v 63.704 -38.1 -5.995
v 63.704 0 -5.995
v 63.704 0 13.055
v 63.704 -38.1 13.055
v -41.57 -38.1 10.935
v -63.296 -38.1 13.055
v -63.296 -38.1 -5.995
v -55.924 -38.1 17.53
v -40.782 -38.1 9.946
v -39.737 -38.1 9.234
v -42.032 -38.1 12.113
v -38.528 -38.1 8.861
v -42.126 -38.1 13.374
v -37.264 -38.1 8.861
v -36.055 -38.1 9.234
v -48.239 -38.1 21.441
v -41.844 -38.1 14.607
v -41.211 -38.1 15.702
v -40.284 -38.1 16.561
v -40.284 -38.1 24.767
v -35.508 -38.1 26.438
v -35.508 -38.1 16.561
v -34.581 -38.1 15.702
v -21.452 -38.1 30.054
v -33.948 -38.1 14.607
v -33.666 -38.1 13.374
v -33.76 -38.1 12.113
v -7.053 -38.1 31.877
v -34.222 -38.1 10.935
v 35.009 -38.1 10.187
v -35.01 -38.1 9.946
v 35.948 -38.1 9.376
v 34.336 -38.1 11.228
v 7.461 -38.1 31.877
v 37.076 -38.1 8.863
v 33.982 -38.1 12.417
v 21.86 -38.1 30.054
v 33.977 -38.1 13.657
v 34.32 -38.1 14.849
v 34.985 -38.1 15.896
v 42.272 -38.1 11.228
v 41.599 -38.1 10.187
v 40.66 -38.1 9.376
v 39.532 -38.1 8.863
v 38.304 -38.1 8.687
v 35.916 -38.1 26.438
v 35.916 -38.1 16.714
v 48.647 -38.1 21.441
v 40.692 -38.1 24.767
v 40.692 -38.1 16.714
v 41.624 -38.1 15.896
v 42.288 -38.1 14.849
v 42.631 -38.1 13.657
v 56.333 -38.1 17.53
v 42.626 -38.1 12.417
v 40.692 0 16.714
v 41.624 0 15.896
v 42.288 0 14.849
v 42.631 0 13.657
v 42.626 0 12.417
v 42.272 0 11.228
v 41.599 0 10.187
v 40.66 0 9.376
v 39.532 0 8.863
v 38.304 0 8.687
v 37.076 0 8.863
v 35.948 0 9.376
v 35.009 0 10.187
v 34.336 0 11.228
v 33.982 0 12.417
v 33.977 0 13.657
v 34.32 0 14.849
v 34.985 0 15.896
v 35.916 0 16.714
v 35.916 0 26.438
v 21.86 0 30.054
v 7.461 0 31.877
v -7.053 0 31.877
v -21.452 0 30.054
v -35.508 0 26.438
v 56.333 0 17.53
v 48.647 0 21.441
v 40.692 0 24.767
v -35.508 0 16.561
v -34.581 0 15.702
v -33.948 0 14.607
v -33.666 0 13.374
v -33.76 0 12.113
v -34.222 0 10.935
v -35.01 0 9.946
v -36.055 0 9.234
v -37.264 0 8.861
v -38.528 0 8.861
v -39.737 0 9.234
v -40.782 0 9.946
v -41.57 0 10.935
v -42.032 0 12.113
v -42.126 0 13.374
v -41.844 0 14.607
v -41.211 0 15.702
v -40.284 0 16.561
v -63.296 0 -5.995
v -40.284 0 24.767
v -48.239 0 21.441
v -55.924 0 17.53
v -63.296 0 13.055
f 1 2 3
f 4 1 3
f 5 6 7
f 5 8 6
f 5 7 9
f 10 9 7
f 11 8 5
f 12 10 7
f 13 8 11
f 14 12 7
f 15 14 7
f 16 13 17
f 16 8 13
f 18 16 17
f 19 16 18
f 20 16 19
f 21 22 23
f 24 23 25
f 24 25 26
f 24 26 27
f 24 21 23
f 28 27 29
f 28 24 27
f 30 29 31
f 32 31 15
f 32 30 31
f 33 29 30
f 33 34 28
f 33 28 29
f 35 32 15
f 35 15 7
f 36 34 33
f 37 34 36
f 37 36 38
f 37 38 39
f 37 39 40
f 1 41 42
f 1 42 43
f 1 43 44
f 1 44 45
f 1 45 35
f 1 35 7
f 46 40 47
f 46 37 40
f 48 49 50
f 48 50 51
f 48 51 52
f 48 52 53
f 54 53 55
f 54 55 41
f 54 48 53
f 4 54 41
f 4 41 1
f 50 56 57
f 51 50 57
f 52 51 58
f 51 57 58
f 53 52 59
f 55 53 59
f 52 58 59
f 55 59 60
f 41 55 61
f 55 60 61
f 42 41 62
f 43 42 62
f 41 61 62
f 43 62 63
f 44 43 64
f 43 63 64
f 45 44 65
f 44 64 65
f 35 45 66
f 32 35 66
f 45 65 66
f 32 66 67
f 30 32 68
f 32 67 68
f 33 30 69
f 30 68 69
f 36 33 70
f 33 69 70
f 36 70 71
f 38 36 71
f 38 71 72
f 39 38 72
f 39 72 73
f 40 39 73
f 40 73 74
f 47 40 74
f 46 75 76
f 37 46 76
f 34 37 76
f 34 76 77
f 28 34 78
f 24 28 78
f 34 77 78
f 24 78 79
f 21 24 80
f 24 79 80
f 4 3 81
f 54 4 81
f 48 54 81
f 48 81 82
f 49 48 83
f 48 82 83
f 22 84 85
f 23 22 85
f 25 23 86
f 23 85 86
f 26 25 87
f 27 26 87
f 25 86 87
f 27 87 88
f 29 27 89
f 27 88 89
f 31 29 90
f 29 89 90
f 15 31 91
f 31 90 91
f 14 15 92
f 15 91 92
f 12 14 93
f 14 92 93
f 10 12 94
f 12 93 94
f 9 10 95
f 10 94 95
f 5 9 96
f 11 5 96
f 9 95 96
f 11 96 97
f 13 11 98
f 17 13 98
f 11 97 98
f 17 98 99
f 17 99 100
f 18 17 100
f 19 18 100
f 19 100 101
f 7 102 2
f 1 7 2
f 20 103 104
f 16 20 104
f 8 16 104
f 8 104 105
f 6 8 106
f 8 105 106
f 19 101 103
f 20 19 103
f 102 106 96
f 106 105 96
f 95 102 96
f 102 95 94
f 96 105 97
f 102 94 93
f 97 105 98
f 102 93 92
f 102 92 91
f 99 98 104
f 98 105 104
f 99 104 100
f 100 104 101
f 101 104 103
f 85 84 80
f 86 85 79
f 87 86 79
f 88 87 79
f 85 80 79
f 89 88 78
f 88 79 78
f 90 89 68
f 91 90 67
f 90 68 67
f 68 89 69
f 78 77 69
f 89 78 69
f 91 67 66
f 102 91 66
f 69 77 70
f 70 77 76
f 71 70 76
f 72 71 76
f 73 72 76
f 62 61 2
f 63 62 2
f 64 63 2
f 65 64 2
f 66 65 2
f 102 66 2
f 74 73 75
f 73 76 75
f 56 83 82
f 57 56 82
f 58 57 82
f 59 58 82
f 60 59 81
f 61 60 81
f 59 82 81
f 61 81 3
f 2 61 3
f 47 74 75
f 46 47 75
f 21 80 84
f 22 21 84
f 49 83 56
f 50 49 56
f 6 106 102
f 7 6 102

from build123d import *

# Parameters (mm, degrees)
F1_DEPTH = 38.1


with BuildPart() as f1:
    # F0 (on Front) → F1 (new body)
    with BuildSketch(Plane.XZ):
        with BuildLine():
            Line((-63.295935, 13.055353), (-63.295935, -5.994647))
            Line((-63.295935, -5.994647), (63.704065, -5.994647))
            Line((63.704065, -5.994647), (63.704065, 13.055353))
            ThreePointArc((63.704065, 13.055353), (52.526578, 19.557037), (40.691665, 24.766922))
            Line((40.691665, 24.766922), (40.691665, 16.714011))
            ThreePointArc((40.691665, 16.714011), (38.304065, 8.686553), (35.916465, 16.714011))
            Line((35.916465, 16.714011), (35.916465, 26.438266))
            ThreePointArc((35.916465, 26.438266), (0.204065, 32.105353), (-35.508335, 26.438266))
            Line((-35.508335, 26.438266), (-35.508335, 23.897591))
            Line((-35.508335, 23.897591), (-35.508335, 16.561381))
            ThreePointArc((-35.508335, 16.561381), (-37.895935, 8.813553), (-40.283535, 16.561381))
            Line((-40.283535, 16.561381), (-40.283535, 24.766922))
            ThreePointArc((-40.283535, 24.766922), (-52.118449, 19.557037), (-63.295935, 13.055353))
        make_face()
    extrude(amount=F1_DEPTH)


solid = f1.part
